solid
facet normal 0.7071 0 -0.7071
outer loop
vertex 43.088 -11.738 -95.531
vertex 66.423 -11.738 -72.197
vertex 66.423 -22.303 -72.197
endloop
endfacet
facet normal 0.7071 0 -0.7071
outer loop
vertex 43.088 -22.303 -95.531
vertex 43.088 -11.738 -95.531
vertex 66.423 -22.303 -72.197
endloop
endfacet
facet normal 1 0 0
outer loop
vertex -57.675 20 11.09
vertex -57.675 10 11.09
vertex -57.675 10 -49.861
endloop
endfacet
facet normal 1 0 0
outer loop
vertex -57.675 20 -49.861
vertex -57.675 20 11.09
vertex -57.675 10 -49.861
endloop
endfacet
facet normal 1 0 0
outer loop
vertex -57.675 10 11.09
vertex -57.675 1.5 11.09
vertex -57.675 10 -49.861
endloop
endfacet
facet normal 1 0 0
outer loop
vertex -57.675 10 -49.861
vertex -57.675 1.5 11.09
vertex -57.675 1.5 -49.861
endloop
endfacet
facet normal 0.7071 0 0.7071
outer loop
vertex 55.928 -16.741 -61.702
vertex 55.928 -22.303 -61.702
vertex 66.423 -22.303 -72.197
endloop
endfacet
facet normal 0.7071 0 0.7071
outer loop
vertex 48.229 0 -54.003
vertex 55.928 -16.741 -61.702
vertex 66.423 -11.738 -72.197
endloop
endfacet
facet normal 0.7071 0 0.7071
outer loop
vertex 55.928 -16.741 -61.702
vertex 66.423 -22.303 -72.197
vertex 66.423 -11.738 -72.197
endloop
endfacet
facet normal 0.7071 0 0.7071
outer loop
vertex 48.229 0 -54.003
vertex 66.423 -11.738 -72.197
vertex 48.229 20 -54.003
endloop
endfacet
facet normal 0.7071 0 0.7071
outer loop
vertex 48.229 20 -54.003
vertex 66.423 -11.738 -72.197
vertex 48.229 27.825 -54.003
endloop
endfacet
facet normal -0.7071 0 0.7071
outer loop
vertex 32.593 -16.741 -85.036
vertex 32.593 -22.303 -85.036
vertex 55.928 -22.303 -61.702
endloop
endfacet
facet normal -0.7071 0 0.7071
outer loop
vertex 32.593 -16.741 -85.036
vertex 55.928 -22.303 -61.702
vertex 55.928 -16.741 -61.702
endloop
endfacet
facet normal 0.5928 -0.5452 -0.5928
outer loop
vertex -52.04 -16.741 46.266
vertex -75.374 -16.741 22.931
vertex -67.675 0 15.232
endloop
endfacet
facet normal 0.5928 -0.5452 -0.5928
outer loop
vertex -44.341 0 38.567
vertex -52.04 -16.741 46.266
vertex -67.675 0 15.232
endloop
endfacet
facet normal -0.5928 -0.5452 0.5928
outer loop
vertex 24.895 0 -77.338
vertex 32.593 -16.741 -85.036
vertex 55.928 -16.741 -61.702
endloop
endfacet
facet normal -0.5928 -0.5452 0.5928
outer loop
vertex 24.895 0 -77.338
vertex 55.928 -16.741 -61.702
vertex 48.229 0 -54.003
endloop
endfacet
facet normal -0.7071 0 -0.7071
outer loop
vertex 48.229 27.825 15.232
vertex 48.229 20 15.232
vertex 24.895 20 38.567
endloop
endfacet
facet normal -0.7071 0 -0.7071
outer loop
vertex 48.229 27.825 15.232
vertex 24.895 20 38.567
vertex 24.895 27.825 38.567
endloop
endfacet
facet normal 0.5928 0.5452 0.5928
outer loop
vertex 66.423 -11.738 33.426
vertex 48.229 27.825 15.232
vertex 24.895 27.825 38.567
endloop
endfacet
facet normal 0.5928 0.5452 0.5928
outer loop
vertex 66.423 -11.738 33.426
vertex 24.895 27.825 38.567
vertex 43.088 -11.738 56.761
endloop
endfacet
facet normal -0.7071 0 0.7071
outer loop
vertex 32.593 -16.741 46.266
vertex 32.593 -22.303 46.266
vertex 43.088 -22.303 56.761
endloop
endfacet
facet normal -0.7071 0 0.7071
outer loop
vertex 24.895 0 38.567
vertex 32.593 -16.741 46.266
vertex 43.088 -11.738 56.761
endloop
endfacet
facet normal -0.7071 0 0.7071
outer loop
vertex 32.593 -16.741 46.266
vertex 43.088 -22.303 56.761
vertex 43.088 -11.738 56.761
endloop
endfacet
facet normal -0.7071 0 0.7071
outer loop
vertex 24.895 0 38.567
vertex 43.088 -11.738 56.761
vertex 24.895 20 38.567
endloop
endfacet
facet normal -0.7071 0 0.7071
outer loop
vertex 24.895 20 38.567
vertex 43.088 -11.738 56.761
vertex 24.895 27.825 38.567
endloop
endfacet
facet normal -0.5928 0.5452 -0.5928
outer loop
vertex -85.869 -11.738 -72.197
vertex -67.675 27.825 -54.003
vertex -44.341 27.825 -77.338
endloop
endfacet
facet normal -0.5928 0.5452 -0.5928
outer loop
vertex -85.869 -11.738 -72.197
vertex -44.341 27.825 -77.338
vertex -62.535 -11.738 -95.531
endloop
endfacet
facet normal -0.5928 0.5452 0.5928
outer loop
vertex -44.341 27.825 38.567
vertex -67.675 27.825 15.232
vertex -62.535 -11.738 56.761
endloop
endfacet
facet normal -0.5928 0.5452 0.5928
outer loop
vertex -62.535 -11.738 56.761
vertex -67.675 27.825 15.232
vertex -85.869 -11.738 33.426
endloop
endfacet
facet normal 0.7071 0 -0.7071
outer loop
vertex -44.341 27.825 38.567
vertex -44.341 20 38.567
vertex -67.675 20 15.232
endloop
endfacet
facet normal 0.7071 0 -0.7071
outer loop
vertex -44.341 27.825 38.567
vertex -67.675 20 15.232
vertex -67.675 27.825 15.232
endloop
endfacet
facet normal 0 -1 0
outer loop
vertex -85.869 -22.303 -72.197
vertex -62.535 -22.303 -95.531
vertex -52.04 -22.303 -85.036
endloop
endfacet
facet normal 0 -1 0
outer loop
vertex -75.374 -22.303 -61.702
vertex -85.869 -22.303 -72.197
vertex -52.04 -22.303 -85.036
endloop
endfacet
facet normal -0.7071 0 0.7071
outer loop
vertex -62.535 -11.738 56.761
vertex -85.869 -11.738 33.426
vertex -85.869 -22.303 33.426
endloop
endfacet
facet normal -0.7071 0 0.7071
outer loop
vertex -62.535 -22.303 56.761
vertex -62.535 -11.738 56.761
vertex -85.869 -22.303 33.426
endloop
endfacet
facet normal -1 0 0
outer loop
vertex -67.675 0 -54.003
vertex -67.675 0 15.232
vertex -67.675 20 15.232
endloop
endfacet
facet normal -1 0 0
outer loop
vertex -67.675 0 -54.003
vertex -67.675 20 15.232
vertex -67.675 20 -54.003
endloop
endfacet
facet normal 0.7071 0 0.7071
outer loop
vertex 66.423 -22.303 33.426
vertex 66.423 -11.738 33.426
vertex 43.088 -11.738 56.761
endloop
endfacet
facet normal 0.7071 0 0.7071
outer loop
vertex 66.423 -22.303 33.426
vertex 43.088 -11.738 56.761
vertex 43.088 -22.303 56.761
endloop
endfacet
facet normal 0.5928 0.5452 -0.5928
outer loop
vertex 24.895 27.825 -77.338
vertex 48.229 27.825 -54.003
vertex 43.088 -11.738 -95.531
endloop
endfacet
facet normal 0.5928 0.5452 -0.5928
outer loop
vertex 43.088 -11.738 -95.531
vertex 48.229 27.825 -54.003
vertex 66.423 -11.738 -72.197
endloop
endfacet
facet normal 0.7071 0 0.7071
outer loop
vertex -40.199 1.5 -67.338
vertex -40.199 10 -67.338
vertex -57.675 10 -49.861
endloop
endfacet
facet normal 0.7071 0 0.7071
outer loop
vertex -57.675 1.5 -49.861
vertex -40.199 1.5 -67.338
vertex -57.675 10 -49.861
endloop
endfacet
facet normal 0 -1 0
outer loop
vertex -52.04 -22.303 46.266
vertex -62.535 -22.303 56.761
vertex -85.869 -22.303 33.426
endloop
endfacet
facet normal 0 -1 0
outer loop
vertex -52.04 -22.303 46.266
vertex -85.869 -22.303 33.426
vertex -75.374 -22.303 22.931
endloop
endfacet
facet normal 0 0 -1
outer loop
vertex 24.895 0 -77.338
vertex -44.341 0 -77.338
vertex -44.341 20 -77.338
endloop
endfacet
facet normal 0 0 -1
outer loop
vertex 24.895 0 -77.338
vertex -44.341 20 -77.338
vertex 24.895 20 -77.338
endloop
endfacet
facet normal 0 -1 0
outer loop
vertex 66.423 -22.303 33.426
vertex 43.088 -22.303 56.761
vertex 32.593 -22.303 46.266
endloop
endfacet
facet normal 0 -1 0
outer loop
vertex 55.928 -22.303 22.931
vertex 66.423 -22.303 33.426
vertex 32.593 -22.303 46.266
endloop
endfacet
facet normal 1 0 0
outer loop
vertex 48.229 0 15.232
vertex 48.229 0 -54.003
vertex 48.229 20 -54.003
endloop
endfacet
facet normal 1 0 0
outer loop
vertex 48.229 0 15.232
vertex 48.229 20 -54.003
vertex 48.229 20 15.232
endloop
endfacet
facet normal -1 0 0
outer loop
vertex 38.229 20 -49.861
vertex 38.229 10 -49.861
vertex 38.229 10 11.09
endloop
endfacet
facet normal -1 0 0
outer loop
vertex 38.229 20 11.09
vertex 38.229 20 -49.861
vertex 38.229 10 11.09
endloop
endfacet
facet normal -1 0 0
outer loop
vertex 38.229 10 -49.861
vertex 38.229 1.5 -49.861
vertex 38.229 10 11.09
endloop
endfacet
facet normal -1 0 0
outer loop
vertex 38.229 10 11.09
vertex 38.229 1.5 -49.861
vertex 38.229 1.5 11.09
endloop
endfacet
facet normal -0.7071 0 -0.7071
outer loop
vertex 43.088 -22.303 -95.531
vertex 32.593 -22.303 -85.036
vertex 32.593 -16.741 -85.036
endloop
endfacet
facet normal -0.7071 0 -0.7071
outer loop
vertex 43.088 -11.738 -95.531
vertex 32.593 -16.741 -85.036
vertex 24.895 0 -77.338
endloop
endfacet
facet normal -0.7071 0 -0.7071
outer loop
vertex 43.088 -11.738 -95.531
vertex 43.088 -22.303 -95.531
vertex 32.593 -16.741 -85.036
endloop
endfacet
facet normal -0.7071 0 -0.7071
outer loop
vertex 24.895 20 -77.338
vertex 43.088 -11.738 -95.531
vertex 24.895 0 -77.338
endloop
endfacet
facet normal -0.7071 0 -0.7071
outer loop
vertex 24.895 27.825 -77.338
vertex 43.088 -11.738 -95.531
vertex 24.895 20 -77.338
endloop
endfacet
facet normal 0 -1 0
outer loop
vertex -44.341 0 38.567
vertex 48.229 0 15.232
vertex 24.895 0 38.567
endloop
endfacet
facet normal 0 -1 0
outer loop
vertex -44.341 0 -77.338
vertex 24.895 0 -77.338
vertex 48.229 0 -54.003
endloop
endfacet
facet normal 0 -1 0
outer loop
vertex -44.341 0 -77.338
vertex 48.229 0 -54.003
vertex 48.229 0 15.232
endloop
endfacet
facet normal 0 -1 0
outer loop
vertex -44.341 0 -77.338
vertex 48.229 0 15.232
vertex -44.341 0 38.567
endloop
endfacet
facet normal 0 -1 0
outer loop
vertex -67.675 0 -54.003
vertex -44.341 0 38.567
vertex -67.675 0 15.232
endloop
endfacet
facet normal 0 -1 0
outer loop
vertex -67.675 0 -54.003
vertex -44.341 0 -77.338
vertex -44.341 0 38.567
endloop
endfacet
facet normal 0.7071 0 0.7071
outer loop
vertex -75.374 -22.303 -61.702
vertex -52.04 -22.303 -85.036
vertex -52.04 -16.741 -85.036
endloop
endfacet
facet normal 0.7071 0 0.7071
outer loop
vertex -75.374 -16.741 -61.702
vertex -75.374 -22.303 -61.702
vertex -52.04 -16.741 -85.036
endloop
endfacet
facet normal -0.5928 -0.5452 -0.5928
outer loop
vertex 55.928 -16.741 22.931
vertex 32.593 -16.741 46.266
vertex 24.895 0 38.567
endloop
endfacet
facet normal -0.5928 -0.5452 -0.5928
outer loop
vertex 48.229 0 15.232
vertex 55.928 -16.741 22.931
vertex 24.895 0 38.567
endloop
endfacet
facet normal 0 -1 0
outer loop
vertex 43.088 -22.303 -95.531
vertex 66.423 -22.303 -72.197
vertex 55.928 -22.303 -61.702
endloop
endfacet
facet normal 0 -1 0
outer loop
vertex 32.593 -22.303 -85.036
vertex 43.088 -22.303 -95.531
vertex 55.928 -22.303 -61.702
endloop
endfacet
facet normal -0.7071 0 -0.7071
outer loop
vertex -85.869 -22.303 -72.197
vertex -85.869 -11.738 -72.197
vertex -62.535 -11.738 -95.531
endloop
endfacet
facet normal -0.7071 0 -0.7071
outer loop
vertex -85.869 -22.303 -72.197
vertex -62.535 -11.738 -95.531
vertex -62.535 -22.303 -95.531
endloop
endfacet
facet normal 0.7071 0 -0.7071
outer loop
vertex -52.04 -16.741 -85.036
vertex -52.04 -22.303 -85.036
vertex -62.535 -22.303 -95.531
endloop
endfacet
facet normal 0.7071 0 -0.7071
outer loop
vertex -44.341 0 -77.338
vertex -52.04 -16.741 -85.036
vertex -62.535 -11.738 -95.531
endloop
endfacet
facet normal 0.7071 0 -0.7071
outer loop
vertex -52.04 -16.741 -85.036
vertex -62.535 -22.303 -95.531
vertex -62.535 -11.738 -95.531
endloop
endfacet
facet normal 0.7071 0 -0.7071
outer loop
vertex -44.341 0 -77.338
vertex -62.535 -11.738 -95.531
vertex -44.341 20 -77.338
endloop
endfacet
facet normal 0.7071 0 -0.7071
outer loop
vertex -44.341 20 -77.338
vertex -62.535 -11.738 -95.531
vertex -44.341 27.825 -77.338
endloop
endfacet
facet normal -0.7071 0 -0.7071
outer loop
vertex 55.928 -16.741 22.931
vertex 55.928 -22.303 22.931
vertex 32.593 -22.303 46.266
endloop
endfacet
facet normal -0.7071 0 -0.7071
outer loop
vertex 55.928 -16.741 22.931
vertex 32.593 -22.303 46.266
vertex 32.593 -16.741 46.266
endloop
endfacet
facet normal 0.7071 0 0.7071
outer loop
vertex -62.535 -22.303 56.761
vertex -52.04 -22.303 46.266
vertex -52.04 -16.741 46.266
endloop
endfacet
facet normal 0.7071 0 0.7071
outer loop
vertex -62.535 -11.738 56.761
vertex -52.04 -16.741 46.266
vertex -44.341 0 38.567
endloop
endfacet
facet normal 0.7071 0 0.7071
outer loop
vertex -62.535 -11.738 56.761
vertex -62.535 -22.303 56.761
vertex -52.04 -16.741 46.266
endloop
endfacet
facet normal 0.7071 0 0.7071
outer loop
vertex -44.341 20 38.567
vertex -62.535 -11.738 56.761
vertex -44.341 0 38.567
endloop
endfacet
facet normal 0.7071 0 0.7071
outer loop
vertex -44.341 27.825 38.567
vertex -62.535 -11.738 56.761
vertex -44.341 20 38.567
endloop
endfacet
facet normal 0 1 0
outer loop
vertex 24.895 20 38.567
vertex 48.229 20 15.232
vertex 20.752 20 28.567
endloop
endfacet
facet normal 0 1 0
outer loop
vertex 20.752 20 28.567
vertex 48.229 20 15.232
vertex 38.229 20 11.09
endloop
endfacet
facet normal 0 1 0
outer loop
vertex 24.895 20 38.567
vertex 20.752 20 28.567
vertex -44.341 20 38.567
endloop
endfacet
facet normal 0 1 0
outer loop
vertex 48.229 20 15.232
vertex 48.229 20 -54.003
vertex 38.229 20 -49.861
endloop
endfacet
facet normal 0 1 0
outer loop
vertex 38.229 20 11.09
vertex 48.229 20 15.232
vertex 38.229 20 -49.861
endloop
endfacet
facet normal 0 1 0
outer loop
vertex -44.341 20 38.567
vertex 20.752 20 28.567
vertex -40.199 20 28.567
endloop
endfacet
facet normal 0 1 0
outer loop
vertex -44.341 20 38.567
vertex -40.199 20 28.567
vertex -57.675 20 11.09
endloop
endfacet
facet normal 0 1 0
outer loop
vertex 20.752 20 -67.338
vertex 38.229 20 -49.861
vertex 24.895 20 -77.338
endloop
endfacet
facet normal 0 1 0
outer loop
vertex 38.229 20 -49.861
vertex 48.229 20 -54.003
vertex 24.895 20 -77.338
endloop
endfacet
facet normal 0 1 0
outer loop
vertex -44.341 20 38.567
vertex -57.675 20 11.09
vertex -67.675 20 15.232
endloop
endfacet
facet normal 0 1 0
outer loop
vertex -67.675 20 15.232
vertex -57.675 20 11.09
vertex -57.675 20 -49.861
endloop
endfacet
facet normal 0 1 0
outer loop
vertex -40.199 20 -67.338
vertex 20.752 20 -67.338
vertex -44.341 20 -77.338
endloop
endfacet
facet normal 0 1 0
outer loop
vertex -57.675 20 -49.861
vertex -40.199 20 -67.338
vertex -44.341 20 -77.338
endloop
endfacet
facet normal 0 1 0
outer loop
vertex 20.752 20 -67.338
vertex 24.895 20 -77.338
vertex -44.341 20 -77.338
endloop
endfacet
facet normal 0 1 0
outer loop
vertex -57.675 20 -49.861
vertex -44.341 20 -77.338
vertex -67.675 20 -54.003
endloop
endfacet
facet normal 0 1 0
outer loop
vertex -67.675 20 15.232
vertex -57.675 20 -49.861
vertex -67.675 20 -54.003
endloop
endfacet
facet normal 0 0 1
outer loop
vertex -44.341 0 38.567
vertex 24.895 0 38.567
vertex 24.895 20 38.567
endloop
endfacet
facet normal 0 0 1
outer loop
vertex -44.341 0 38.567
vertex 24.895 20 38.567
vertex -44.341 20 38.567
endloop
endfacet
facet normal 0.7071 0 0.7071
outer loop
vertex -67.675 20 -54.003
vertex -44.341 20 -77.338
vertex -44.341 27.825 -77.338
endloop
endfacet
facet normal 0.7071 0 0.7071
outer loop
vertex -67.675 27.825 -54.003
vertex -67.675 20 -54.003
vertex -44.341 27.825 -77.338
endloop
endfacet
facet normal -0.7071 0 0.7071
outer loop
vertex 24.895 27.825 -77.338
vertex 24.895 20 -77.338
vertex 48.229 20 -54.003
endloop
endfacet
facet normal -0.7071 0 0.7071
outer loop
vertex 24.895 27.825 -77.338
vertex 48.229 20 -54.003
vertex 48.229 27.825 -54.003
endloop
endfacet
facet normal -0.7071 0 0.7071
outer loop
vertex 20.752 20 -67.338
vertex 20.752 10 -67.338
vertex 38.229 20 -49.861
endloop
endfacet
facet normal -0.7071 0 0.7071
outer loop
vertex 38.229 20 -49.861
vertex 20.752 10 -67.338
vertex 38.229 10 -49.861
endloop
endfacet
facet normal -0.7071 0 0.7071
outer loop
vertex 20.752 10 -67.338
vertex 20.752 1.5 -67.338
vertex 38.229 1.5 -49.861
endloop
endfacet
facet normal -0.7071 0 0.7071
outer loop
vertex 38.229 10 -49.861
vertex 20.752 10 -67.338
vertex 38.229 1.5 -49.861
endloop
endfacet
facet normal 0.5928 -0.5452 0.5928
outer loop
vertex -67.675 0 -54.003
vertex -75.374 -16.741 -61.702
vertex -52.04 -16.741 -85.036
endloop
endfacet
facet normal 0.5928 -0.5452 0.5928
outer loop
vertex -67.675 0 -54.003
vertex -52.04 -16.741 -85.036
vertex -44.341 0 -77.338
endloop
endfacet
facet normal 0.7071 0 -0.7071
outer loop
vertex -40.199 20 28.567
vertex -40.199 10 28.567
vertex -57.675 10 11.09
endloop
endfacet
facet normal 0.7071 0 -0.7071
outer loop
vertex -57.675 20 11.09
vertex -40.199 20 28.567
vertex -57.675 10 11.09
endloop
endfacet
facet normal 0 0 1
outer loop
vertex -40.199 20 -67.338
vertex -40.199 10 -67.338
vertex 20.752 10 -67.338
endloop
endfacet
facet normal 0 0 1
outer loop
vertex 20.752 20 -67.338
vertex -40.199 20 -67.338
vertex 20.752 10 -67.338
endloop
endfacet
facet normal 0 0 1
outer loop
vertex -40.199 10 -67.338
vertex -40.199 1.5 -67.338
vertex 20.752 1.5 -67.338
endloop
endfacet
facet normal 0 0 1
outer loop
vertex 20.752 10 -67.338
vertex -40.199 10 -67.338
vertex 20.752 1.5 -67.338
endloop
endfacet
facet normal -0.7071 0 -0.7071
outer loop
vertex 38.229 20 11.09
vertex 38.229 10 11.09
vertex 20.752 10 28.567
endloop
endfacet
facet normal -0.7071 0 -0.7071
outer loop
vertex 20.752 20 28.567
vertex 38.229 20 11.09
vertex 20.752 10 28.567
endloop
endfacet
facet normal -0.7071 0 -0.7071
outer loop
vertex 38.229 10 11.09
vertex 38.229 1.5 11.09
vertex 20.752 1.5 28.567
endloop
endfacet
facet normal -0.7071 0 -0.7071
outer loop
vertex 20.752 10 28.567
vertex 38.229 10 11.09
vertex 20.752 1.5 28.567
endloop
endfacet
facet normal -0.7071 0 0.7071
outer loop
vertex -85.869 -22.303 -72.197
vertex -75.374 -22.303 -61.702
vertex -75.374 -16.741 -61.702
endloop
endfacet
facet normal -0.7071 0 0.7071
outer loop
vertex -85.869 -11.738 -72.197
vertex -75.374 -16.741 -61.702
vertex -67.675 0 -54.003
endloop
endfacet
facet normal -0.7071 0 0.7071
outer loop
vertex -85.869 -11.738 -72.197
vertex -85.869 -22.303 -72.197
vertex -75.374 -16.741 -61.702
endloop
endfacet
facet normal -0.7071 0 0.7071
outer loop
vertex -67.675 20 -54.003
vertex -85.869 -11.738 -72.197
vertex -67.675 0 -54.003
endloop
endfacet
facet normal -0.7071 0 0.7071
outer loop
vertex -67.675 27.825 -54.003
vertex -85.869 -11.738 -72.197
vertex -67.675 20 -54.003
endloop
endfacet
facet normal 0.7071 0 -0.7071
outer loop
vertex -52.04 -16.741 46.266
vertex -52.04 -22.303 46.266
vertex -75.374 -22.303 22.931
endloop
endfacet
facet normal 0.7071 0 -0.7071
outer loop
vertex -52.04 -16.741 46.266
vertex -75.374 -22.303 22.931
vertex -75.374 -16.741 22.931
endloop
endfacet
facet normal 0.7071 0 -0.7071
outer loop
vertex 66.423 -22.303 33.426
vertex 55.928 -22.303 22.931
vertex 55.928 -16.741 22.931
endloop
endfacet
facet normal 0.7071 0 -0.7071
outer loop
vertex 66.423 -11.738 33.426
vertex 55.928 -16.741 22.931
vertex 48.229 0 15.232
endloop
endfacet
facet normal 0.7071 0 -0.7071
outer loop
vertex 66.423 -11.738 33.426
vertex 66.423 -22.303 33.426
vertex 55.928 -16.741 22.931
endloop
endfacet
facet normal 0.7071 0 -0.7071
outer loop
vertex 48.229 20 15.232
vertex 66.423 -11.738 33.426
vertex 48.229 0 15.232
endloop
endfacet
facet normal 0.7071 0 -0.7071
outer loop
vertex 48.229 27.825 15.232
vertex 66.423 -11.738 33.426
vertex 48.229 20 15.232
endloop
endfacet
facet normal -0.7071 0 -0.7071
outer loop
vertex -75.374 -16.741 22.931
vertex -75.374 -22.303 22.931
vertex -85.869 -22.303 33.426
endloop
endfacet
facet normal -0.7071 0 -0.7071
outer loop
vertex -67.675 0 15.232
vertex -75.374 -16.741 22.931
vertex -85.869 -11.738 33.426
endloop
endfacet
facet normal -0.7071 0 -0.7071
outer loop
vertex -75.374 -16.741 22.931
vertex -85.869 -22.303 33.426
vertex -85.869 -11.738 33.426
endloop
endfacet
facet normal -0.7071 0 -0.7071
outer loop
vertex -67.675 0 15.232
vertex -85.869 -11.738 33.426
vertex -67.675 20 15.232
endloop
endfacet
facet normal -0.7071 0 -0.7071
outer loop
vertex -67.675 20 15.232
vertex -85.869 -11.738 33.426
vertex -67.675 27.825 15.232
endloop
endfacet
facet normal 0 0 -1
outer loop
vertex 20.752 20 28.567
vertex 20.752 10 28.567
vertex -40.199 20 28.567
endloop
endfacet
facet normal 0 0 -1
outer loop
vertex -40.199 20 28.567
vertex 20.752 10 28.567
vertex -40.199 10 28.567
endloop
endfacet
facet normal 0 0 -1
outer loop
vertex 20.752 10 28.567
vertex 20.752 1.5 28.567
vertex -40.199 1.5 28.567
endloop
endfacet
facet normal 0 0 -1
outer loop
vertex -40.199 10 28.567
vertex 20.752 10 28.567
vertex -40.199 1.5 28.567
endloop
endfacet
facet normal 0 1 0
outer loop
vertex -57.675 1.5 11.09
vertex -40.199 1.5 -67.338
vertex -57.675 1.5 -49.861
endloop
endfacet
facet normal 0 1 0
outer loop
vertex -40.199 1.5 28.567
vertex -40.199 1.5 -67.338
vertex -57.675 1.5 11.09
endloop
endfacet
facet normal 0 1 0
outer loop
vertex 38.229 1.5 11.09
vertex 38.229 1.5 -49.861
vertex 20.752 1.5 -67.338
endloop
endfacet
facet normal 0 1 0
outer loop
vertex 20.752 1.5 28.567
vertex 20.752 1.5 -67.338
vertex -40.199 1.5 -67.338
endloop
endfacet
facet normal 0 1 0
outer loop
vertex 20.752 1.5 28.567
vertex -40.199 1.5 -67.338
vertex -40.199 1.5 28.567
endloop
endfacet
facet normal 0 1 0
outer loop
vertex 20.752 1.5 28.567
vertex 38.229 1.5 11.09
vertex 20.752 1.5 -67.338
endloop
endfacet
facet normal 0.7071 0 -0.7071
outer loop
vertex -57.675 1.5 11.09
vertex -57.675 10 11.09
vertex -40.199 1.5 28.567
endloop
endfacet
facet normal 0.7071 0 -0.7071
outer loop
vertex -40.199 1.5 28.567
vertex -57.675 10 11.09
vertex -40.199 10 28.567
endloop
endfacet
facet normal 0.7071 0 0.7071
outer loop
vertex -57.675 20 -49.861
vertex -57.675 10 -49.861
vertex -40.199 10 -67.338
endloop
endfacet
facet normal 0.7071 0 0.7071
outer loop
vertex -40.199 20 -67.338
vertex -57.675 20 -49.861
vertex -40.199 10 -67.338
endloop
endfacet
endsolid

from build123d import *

# Parameters (mm, degrees)
BOSS_EXTRUDE1_DEPTH      = 20
SHELL1_T                 = -10
SHELL1_THICKNESS_2_DEPTH = 8.5
BOSS_EXTRUDE2_DEPTH      = 33
MIRROR2_COPY_1_DEPTH     = 33


with BuildPart() as part:
    # Sketch1 → Boss-Extrude1 (new body)
    with BuildSketch(Plane(origin=(0, 0, 0), x_dir=(1, 0, 0), z_dir=(0, 1, 0))):
        Polygon((24.894532576, 77.33756703), (48.229056355, 54.003043251), (48.229056355, -15.232403626), (24.894532576, -38.566927405), (-44.340914301, -38.566927405), (-67.675438081, -15.232403626), (-67.675438081, 54.003043251), (-44.340914301, 77.33756703), align=None)
    extrude(amount=BOSS_EXTRUDE1_DEPTH)

    # Shell1
    shell1_openings = [part.faces().sort_by_distance(p)[0] for p in [
        (-9.723190863, 20, -19.385319812),
    ]]
    offset(amount=SHELL1_T, openings=shell1_openings, kind=Kind.INTERSECTION)

    # Shell1 thickness 2 face (on inner face of the shell) → Shell1 thickness 2 (cut)
    with BuildSketch(Plane(origin=(-9.723190863, 10, -19.385319812), x_dir=(0, 0, -1), z_dir=(0, -1, 0))):
        Polygon((30.475587815, 47.952247218), (47.952247218, 30.475587815), (47.952247218, -30.475587815), (30.475587815, -47.952247218), (-30.475587814, -47.952247218), (-47.952247217, -30.475587815), (-47.952247217, 30.475587815), (-30.475587814, 47.952247218), align=None)
    extrude(amount=SHELL1_THICKNESS_2_DEPTH, mode=Mode.SUBTRACT)

    # Sketch3 → Boss-Extrude2 (add)
    with BuildSketch(Plane(origin=(-6.836197415, 0, 6.836197415), x_dir=(0, -1, 0), z_dir=(0.7071067811865477, 0, -0.7071067811865475))):
        Polygon((-27.824686591, 86.039679274), (11.738008985, 111.769453035), (22.303053884, 111.769453035), (22.303053884, 96.927374932), (16.741172808, 96.927374932), (0, 86.039679274), align=None)
    boss_extrude2 = extrude(amount=BOSS_EXTRUDE2_DEPTH)

    # Mirror1: Boss-Extrude2 across plane
    add(boss_extrude2.mirror(Plane.XY.offset(-19.385319812)))

    # Mirror2: Boss-Extrude2 across plane
    add(boss_extrude2.mirror(Plane.ZY.offset(9.723190863)))

    # Mirror2 copy 1 sketch → Mirror2 copy 1 (add)
    with BuildSketch(Plane(origin=(-12.610184311, 0, -45.60683704), x_dir=(0, -1, 0), z_dir=(-0.7071067811865477, 0, 0.7071067811865475))):
        Polygon((-27.824686591, 86.039679274), (11.738008985, 111.769453035), (22.303053884, 111.769453035), (22.303053884, 96.927374932), (16.741172808, 96.927374932), (0, 86.039679274), align=None)
    extrude(amount=MIRROR2_COPY_1_DEPTH)


solid = part.part
